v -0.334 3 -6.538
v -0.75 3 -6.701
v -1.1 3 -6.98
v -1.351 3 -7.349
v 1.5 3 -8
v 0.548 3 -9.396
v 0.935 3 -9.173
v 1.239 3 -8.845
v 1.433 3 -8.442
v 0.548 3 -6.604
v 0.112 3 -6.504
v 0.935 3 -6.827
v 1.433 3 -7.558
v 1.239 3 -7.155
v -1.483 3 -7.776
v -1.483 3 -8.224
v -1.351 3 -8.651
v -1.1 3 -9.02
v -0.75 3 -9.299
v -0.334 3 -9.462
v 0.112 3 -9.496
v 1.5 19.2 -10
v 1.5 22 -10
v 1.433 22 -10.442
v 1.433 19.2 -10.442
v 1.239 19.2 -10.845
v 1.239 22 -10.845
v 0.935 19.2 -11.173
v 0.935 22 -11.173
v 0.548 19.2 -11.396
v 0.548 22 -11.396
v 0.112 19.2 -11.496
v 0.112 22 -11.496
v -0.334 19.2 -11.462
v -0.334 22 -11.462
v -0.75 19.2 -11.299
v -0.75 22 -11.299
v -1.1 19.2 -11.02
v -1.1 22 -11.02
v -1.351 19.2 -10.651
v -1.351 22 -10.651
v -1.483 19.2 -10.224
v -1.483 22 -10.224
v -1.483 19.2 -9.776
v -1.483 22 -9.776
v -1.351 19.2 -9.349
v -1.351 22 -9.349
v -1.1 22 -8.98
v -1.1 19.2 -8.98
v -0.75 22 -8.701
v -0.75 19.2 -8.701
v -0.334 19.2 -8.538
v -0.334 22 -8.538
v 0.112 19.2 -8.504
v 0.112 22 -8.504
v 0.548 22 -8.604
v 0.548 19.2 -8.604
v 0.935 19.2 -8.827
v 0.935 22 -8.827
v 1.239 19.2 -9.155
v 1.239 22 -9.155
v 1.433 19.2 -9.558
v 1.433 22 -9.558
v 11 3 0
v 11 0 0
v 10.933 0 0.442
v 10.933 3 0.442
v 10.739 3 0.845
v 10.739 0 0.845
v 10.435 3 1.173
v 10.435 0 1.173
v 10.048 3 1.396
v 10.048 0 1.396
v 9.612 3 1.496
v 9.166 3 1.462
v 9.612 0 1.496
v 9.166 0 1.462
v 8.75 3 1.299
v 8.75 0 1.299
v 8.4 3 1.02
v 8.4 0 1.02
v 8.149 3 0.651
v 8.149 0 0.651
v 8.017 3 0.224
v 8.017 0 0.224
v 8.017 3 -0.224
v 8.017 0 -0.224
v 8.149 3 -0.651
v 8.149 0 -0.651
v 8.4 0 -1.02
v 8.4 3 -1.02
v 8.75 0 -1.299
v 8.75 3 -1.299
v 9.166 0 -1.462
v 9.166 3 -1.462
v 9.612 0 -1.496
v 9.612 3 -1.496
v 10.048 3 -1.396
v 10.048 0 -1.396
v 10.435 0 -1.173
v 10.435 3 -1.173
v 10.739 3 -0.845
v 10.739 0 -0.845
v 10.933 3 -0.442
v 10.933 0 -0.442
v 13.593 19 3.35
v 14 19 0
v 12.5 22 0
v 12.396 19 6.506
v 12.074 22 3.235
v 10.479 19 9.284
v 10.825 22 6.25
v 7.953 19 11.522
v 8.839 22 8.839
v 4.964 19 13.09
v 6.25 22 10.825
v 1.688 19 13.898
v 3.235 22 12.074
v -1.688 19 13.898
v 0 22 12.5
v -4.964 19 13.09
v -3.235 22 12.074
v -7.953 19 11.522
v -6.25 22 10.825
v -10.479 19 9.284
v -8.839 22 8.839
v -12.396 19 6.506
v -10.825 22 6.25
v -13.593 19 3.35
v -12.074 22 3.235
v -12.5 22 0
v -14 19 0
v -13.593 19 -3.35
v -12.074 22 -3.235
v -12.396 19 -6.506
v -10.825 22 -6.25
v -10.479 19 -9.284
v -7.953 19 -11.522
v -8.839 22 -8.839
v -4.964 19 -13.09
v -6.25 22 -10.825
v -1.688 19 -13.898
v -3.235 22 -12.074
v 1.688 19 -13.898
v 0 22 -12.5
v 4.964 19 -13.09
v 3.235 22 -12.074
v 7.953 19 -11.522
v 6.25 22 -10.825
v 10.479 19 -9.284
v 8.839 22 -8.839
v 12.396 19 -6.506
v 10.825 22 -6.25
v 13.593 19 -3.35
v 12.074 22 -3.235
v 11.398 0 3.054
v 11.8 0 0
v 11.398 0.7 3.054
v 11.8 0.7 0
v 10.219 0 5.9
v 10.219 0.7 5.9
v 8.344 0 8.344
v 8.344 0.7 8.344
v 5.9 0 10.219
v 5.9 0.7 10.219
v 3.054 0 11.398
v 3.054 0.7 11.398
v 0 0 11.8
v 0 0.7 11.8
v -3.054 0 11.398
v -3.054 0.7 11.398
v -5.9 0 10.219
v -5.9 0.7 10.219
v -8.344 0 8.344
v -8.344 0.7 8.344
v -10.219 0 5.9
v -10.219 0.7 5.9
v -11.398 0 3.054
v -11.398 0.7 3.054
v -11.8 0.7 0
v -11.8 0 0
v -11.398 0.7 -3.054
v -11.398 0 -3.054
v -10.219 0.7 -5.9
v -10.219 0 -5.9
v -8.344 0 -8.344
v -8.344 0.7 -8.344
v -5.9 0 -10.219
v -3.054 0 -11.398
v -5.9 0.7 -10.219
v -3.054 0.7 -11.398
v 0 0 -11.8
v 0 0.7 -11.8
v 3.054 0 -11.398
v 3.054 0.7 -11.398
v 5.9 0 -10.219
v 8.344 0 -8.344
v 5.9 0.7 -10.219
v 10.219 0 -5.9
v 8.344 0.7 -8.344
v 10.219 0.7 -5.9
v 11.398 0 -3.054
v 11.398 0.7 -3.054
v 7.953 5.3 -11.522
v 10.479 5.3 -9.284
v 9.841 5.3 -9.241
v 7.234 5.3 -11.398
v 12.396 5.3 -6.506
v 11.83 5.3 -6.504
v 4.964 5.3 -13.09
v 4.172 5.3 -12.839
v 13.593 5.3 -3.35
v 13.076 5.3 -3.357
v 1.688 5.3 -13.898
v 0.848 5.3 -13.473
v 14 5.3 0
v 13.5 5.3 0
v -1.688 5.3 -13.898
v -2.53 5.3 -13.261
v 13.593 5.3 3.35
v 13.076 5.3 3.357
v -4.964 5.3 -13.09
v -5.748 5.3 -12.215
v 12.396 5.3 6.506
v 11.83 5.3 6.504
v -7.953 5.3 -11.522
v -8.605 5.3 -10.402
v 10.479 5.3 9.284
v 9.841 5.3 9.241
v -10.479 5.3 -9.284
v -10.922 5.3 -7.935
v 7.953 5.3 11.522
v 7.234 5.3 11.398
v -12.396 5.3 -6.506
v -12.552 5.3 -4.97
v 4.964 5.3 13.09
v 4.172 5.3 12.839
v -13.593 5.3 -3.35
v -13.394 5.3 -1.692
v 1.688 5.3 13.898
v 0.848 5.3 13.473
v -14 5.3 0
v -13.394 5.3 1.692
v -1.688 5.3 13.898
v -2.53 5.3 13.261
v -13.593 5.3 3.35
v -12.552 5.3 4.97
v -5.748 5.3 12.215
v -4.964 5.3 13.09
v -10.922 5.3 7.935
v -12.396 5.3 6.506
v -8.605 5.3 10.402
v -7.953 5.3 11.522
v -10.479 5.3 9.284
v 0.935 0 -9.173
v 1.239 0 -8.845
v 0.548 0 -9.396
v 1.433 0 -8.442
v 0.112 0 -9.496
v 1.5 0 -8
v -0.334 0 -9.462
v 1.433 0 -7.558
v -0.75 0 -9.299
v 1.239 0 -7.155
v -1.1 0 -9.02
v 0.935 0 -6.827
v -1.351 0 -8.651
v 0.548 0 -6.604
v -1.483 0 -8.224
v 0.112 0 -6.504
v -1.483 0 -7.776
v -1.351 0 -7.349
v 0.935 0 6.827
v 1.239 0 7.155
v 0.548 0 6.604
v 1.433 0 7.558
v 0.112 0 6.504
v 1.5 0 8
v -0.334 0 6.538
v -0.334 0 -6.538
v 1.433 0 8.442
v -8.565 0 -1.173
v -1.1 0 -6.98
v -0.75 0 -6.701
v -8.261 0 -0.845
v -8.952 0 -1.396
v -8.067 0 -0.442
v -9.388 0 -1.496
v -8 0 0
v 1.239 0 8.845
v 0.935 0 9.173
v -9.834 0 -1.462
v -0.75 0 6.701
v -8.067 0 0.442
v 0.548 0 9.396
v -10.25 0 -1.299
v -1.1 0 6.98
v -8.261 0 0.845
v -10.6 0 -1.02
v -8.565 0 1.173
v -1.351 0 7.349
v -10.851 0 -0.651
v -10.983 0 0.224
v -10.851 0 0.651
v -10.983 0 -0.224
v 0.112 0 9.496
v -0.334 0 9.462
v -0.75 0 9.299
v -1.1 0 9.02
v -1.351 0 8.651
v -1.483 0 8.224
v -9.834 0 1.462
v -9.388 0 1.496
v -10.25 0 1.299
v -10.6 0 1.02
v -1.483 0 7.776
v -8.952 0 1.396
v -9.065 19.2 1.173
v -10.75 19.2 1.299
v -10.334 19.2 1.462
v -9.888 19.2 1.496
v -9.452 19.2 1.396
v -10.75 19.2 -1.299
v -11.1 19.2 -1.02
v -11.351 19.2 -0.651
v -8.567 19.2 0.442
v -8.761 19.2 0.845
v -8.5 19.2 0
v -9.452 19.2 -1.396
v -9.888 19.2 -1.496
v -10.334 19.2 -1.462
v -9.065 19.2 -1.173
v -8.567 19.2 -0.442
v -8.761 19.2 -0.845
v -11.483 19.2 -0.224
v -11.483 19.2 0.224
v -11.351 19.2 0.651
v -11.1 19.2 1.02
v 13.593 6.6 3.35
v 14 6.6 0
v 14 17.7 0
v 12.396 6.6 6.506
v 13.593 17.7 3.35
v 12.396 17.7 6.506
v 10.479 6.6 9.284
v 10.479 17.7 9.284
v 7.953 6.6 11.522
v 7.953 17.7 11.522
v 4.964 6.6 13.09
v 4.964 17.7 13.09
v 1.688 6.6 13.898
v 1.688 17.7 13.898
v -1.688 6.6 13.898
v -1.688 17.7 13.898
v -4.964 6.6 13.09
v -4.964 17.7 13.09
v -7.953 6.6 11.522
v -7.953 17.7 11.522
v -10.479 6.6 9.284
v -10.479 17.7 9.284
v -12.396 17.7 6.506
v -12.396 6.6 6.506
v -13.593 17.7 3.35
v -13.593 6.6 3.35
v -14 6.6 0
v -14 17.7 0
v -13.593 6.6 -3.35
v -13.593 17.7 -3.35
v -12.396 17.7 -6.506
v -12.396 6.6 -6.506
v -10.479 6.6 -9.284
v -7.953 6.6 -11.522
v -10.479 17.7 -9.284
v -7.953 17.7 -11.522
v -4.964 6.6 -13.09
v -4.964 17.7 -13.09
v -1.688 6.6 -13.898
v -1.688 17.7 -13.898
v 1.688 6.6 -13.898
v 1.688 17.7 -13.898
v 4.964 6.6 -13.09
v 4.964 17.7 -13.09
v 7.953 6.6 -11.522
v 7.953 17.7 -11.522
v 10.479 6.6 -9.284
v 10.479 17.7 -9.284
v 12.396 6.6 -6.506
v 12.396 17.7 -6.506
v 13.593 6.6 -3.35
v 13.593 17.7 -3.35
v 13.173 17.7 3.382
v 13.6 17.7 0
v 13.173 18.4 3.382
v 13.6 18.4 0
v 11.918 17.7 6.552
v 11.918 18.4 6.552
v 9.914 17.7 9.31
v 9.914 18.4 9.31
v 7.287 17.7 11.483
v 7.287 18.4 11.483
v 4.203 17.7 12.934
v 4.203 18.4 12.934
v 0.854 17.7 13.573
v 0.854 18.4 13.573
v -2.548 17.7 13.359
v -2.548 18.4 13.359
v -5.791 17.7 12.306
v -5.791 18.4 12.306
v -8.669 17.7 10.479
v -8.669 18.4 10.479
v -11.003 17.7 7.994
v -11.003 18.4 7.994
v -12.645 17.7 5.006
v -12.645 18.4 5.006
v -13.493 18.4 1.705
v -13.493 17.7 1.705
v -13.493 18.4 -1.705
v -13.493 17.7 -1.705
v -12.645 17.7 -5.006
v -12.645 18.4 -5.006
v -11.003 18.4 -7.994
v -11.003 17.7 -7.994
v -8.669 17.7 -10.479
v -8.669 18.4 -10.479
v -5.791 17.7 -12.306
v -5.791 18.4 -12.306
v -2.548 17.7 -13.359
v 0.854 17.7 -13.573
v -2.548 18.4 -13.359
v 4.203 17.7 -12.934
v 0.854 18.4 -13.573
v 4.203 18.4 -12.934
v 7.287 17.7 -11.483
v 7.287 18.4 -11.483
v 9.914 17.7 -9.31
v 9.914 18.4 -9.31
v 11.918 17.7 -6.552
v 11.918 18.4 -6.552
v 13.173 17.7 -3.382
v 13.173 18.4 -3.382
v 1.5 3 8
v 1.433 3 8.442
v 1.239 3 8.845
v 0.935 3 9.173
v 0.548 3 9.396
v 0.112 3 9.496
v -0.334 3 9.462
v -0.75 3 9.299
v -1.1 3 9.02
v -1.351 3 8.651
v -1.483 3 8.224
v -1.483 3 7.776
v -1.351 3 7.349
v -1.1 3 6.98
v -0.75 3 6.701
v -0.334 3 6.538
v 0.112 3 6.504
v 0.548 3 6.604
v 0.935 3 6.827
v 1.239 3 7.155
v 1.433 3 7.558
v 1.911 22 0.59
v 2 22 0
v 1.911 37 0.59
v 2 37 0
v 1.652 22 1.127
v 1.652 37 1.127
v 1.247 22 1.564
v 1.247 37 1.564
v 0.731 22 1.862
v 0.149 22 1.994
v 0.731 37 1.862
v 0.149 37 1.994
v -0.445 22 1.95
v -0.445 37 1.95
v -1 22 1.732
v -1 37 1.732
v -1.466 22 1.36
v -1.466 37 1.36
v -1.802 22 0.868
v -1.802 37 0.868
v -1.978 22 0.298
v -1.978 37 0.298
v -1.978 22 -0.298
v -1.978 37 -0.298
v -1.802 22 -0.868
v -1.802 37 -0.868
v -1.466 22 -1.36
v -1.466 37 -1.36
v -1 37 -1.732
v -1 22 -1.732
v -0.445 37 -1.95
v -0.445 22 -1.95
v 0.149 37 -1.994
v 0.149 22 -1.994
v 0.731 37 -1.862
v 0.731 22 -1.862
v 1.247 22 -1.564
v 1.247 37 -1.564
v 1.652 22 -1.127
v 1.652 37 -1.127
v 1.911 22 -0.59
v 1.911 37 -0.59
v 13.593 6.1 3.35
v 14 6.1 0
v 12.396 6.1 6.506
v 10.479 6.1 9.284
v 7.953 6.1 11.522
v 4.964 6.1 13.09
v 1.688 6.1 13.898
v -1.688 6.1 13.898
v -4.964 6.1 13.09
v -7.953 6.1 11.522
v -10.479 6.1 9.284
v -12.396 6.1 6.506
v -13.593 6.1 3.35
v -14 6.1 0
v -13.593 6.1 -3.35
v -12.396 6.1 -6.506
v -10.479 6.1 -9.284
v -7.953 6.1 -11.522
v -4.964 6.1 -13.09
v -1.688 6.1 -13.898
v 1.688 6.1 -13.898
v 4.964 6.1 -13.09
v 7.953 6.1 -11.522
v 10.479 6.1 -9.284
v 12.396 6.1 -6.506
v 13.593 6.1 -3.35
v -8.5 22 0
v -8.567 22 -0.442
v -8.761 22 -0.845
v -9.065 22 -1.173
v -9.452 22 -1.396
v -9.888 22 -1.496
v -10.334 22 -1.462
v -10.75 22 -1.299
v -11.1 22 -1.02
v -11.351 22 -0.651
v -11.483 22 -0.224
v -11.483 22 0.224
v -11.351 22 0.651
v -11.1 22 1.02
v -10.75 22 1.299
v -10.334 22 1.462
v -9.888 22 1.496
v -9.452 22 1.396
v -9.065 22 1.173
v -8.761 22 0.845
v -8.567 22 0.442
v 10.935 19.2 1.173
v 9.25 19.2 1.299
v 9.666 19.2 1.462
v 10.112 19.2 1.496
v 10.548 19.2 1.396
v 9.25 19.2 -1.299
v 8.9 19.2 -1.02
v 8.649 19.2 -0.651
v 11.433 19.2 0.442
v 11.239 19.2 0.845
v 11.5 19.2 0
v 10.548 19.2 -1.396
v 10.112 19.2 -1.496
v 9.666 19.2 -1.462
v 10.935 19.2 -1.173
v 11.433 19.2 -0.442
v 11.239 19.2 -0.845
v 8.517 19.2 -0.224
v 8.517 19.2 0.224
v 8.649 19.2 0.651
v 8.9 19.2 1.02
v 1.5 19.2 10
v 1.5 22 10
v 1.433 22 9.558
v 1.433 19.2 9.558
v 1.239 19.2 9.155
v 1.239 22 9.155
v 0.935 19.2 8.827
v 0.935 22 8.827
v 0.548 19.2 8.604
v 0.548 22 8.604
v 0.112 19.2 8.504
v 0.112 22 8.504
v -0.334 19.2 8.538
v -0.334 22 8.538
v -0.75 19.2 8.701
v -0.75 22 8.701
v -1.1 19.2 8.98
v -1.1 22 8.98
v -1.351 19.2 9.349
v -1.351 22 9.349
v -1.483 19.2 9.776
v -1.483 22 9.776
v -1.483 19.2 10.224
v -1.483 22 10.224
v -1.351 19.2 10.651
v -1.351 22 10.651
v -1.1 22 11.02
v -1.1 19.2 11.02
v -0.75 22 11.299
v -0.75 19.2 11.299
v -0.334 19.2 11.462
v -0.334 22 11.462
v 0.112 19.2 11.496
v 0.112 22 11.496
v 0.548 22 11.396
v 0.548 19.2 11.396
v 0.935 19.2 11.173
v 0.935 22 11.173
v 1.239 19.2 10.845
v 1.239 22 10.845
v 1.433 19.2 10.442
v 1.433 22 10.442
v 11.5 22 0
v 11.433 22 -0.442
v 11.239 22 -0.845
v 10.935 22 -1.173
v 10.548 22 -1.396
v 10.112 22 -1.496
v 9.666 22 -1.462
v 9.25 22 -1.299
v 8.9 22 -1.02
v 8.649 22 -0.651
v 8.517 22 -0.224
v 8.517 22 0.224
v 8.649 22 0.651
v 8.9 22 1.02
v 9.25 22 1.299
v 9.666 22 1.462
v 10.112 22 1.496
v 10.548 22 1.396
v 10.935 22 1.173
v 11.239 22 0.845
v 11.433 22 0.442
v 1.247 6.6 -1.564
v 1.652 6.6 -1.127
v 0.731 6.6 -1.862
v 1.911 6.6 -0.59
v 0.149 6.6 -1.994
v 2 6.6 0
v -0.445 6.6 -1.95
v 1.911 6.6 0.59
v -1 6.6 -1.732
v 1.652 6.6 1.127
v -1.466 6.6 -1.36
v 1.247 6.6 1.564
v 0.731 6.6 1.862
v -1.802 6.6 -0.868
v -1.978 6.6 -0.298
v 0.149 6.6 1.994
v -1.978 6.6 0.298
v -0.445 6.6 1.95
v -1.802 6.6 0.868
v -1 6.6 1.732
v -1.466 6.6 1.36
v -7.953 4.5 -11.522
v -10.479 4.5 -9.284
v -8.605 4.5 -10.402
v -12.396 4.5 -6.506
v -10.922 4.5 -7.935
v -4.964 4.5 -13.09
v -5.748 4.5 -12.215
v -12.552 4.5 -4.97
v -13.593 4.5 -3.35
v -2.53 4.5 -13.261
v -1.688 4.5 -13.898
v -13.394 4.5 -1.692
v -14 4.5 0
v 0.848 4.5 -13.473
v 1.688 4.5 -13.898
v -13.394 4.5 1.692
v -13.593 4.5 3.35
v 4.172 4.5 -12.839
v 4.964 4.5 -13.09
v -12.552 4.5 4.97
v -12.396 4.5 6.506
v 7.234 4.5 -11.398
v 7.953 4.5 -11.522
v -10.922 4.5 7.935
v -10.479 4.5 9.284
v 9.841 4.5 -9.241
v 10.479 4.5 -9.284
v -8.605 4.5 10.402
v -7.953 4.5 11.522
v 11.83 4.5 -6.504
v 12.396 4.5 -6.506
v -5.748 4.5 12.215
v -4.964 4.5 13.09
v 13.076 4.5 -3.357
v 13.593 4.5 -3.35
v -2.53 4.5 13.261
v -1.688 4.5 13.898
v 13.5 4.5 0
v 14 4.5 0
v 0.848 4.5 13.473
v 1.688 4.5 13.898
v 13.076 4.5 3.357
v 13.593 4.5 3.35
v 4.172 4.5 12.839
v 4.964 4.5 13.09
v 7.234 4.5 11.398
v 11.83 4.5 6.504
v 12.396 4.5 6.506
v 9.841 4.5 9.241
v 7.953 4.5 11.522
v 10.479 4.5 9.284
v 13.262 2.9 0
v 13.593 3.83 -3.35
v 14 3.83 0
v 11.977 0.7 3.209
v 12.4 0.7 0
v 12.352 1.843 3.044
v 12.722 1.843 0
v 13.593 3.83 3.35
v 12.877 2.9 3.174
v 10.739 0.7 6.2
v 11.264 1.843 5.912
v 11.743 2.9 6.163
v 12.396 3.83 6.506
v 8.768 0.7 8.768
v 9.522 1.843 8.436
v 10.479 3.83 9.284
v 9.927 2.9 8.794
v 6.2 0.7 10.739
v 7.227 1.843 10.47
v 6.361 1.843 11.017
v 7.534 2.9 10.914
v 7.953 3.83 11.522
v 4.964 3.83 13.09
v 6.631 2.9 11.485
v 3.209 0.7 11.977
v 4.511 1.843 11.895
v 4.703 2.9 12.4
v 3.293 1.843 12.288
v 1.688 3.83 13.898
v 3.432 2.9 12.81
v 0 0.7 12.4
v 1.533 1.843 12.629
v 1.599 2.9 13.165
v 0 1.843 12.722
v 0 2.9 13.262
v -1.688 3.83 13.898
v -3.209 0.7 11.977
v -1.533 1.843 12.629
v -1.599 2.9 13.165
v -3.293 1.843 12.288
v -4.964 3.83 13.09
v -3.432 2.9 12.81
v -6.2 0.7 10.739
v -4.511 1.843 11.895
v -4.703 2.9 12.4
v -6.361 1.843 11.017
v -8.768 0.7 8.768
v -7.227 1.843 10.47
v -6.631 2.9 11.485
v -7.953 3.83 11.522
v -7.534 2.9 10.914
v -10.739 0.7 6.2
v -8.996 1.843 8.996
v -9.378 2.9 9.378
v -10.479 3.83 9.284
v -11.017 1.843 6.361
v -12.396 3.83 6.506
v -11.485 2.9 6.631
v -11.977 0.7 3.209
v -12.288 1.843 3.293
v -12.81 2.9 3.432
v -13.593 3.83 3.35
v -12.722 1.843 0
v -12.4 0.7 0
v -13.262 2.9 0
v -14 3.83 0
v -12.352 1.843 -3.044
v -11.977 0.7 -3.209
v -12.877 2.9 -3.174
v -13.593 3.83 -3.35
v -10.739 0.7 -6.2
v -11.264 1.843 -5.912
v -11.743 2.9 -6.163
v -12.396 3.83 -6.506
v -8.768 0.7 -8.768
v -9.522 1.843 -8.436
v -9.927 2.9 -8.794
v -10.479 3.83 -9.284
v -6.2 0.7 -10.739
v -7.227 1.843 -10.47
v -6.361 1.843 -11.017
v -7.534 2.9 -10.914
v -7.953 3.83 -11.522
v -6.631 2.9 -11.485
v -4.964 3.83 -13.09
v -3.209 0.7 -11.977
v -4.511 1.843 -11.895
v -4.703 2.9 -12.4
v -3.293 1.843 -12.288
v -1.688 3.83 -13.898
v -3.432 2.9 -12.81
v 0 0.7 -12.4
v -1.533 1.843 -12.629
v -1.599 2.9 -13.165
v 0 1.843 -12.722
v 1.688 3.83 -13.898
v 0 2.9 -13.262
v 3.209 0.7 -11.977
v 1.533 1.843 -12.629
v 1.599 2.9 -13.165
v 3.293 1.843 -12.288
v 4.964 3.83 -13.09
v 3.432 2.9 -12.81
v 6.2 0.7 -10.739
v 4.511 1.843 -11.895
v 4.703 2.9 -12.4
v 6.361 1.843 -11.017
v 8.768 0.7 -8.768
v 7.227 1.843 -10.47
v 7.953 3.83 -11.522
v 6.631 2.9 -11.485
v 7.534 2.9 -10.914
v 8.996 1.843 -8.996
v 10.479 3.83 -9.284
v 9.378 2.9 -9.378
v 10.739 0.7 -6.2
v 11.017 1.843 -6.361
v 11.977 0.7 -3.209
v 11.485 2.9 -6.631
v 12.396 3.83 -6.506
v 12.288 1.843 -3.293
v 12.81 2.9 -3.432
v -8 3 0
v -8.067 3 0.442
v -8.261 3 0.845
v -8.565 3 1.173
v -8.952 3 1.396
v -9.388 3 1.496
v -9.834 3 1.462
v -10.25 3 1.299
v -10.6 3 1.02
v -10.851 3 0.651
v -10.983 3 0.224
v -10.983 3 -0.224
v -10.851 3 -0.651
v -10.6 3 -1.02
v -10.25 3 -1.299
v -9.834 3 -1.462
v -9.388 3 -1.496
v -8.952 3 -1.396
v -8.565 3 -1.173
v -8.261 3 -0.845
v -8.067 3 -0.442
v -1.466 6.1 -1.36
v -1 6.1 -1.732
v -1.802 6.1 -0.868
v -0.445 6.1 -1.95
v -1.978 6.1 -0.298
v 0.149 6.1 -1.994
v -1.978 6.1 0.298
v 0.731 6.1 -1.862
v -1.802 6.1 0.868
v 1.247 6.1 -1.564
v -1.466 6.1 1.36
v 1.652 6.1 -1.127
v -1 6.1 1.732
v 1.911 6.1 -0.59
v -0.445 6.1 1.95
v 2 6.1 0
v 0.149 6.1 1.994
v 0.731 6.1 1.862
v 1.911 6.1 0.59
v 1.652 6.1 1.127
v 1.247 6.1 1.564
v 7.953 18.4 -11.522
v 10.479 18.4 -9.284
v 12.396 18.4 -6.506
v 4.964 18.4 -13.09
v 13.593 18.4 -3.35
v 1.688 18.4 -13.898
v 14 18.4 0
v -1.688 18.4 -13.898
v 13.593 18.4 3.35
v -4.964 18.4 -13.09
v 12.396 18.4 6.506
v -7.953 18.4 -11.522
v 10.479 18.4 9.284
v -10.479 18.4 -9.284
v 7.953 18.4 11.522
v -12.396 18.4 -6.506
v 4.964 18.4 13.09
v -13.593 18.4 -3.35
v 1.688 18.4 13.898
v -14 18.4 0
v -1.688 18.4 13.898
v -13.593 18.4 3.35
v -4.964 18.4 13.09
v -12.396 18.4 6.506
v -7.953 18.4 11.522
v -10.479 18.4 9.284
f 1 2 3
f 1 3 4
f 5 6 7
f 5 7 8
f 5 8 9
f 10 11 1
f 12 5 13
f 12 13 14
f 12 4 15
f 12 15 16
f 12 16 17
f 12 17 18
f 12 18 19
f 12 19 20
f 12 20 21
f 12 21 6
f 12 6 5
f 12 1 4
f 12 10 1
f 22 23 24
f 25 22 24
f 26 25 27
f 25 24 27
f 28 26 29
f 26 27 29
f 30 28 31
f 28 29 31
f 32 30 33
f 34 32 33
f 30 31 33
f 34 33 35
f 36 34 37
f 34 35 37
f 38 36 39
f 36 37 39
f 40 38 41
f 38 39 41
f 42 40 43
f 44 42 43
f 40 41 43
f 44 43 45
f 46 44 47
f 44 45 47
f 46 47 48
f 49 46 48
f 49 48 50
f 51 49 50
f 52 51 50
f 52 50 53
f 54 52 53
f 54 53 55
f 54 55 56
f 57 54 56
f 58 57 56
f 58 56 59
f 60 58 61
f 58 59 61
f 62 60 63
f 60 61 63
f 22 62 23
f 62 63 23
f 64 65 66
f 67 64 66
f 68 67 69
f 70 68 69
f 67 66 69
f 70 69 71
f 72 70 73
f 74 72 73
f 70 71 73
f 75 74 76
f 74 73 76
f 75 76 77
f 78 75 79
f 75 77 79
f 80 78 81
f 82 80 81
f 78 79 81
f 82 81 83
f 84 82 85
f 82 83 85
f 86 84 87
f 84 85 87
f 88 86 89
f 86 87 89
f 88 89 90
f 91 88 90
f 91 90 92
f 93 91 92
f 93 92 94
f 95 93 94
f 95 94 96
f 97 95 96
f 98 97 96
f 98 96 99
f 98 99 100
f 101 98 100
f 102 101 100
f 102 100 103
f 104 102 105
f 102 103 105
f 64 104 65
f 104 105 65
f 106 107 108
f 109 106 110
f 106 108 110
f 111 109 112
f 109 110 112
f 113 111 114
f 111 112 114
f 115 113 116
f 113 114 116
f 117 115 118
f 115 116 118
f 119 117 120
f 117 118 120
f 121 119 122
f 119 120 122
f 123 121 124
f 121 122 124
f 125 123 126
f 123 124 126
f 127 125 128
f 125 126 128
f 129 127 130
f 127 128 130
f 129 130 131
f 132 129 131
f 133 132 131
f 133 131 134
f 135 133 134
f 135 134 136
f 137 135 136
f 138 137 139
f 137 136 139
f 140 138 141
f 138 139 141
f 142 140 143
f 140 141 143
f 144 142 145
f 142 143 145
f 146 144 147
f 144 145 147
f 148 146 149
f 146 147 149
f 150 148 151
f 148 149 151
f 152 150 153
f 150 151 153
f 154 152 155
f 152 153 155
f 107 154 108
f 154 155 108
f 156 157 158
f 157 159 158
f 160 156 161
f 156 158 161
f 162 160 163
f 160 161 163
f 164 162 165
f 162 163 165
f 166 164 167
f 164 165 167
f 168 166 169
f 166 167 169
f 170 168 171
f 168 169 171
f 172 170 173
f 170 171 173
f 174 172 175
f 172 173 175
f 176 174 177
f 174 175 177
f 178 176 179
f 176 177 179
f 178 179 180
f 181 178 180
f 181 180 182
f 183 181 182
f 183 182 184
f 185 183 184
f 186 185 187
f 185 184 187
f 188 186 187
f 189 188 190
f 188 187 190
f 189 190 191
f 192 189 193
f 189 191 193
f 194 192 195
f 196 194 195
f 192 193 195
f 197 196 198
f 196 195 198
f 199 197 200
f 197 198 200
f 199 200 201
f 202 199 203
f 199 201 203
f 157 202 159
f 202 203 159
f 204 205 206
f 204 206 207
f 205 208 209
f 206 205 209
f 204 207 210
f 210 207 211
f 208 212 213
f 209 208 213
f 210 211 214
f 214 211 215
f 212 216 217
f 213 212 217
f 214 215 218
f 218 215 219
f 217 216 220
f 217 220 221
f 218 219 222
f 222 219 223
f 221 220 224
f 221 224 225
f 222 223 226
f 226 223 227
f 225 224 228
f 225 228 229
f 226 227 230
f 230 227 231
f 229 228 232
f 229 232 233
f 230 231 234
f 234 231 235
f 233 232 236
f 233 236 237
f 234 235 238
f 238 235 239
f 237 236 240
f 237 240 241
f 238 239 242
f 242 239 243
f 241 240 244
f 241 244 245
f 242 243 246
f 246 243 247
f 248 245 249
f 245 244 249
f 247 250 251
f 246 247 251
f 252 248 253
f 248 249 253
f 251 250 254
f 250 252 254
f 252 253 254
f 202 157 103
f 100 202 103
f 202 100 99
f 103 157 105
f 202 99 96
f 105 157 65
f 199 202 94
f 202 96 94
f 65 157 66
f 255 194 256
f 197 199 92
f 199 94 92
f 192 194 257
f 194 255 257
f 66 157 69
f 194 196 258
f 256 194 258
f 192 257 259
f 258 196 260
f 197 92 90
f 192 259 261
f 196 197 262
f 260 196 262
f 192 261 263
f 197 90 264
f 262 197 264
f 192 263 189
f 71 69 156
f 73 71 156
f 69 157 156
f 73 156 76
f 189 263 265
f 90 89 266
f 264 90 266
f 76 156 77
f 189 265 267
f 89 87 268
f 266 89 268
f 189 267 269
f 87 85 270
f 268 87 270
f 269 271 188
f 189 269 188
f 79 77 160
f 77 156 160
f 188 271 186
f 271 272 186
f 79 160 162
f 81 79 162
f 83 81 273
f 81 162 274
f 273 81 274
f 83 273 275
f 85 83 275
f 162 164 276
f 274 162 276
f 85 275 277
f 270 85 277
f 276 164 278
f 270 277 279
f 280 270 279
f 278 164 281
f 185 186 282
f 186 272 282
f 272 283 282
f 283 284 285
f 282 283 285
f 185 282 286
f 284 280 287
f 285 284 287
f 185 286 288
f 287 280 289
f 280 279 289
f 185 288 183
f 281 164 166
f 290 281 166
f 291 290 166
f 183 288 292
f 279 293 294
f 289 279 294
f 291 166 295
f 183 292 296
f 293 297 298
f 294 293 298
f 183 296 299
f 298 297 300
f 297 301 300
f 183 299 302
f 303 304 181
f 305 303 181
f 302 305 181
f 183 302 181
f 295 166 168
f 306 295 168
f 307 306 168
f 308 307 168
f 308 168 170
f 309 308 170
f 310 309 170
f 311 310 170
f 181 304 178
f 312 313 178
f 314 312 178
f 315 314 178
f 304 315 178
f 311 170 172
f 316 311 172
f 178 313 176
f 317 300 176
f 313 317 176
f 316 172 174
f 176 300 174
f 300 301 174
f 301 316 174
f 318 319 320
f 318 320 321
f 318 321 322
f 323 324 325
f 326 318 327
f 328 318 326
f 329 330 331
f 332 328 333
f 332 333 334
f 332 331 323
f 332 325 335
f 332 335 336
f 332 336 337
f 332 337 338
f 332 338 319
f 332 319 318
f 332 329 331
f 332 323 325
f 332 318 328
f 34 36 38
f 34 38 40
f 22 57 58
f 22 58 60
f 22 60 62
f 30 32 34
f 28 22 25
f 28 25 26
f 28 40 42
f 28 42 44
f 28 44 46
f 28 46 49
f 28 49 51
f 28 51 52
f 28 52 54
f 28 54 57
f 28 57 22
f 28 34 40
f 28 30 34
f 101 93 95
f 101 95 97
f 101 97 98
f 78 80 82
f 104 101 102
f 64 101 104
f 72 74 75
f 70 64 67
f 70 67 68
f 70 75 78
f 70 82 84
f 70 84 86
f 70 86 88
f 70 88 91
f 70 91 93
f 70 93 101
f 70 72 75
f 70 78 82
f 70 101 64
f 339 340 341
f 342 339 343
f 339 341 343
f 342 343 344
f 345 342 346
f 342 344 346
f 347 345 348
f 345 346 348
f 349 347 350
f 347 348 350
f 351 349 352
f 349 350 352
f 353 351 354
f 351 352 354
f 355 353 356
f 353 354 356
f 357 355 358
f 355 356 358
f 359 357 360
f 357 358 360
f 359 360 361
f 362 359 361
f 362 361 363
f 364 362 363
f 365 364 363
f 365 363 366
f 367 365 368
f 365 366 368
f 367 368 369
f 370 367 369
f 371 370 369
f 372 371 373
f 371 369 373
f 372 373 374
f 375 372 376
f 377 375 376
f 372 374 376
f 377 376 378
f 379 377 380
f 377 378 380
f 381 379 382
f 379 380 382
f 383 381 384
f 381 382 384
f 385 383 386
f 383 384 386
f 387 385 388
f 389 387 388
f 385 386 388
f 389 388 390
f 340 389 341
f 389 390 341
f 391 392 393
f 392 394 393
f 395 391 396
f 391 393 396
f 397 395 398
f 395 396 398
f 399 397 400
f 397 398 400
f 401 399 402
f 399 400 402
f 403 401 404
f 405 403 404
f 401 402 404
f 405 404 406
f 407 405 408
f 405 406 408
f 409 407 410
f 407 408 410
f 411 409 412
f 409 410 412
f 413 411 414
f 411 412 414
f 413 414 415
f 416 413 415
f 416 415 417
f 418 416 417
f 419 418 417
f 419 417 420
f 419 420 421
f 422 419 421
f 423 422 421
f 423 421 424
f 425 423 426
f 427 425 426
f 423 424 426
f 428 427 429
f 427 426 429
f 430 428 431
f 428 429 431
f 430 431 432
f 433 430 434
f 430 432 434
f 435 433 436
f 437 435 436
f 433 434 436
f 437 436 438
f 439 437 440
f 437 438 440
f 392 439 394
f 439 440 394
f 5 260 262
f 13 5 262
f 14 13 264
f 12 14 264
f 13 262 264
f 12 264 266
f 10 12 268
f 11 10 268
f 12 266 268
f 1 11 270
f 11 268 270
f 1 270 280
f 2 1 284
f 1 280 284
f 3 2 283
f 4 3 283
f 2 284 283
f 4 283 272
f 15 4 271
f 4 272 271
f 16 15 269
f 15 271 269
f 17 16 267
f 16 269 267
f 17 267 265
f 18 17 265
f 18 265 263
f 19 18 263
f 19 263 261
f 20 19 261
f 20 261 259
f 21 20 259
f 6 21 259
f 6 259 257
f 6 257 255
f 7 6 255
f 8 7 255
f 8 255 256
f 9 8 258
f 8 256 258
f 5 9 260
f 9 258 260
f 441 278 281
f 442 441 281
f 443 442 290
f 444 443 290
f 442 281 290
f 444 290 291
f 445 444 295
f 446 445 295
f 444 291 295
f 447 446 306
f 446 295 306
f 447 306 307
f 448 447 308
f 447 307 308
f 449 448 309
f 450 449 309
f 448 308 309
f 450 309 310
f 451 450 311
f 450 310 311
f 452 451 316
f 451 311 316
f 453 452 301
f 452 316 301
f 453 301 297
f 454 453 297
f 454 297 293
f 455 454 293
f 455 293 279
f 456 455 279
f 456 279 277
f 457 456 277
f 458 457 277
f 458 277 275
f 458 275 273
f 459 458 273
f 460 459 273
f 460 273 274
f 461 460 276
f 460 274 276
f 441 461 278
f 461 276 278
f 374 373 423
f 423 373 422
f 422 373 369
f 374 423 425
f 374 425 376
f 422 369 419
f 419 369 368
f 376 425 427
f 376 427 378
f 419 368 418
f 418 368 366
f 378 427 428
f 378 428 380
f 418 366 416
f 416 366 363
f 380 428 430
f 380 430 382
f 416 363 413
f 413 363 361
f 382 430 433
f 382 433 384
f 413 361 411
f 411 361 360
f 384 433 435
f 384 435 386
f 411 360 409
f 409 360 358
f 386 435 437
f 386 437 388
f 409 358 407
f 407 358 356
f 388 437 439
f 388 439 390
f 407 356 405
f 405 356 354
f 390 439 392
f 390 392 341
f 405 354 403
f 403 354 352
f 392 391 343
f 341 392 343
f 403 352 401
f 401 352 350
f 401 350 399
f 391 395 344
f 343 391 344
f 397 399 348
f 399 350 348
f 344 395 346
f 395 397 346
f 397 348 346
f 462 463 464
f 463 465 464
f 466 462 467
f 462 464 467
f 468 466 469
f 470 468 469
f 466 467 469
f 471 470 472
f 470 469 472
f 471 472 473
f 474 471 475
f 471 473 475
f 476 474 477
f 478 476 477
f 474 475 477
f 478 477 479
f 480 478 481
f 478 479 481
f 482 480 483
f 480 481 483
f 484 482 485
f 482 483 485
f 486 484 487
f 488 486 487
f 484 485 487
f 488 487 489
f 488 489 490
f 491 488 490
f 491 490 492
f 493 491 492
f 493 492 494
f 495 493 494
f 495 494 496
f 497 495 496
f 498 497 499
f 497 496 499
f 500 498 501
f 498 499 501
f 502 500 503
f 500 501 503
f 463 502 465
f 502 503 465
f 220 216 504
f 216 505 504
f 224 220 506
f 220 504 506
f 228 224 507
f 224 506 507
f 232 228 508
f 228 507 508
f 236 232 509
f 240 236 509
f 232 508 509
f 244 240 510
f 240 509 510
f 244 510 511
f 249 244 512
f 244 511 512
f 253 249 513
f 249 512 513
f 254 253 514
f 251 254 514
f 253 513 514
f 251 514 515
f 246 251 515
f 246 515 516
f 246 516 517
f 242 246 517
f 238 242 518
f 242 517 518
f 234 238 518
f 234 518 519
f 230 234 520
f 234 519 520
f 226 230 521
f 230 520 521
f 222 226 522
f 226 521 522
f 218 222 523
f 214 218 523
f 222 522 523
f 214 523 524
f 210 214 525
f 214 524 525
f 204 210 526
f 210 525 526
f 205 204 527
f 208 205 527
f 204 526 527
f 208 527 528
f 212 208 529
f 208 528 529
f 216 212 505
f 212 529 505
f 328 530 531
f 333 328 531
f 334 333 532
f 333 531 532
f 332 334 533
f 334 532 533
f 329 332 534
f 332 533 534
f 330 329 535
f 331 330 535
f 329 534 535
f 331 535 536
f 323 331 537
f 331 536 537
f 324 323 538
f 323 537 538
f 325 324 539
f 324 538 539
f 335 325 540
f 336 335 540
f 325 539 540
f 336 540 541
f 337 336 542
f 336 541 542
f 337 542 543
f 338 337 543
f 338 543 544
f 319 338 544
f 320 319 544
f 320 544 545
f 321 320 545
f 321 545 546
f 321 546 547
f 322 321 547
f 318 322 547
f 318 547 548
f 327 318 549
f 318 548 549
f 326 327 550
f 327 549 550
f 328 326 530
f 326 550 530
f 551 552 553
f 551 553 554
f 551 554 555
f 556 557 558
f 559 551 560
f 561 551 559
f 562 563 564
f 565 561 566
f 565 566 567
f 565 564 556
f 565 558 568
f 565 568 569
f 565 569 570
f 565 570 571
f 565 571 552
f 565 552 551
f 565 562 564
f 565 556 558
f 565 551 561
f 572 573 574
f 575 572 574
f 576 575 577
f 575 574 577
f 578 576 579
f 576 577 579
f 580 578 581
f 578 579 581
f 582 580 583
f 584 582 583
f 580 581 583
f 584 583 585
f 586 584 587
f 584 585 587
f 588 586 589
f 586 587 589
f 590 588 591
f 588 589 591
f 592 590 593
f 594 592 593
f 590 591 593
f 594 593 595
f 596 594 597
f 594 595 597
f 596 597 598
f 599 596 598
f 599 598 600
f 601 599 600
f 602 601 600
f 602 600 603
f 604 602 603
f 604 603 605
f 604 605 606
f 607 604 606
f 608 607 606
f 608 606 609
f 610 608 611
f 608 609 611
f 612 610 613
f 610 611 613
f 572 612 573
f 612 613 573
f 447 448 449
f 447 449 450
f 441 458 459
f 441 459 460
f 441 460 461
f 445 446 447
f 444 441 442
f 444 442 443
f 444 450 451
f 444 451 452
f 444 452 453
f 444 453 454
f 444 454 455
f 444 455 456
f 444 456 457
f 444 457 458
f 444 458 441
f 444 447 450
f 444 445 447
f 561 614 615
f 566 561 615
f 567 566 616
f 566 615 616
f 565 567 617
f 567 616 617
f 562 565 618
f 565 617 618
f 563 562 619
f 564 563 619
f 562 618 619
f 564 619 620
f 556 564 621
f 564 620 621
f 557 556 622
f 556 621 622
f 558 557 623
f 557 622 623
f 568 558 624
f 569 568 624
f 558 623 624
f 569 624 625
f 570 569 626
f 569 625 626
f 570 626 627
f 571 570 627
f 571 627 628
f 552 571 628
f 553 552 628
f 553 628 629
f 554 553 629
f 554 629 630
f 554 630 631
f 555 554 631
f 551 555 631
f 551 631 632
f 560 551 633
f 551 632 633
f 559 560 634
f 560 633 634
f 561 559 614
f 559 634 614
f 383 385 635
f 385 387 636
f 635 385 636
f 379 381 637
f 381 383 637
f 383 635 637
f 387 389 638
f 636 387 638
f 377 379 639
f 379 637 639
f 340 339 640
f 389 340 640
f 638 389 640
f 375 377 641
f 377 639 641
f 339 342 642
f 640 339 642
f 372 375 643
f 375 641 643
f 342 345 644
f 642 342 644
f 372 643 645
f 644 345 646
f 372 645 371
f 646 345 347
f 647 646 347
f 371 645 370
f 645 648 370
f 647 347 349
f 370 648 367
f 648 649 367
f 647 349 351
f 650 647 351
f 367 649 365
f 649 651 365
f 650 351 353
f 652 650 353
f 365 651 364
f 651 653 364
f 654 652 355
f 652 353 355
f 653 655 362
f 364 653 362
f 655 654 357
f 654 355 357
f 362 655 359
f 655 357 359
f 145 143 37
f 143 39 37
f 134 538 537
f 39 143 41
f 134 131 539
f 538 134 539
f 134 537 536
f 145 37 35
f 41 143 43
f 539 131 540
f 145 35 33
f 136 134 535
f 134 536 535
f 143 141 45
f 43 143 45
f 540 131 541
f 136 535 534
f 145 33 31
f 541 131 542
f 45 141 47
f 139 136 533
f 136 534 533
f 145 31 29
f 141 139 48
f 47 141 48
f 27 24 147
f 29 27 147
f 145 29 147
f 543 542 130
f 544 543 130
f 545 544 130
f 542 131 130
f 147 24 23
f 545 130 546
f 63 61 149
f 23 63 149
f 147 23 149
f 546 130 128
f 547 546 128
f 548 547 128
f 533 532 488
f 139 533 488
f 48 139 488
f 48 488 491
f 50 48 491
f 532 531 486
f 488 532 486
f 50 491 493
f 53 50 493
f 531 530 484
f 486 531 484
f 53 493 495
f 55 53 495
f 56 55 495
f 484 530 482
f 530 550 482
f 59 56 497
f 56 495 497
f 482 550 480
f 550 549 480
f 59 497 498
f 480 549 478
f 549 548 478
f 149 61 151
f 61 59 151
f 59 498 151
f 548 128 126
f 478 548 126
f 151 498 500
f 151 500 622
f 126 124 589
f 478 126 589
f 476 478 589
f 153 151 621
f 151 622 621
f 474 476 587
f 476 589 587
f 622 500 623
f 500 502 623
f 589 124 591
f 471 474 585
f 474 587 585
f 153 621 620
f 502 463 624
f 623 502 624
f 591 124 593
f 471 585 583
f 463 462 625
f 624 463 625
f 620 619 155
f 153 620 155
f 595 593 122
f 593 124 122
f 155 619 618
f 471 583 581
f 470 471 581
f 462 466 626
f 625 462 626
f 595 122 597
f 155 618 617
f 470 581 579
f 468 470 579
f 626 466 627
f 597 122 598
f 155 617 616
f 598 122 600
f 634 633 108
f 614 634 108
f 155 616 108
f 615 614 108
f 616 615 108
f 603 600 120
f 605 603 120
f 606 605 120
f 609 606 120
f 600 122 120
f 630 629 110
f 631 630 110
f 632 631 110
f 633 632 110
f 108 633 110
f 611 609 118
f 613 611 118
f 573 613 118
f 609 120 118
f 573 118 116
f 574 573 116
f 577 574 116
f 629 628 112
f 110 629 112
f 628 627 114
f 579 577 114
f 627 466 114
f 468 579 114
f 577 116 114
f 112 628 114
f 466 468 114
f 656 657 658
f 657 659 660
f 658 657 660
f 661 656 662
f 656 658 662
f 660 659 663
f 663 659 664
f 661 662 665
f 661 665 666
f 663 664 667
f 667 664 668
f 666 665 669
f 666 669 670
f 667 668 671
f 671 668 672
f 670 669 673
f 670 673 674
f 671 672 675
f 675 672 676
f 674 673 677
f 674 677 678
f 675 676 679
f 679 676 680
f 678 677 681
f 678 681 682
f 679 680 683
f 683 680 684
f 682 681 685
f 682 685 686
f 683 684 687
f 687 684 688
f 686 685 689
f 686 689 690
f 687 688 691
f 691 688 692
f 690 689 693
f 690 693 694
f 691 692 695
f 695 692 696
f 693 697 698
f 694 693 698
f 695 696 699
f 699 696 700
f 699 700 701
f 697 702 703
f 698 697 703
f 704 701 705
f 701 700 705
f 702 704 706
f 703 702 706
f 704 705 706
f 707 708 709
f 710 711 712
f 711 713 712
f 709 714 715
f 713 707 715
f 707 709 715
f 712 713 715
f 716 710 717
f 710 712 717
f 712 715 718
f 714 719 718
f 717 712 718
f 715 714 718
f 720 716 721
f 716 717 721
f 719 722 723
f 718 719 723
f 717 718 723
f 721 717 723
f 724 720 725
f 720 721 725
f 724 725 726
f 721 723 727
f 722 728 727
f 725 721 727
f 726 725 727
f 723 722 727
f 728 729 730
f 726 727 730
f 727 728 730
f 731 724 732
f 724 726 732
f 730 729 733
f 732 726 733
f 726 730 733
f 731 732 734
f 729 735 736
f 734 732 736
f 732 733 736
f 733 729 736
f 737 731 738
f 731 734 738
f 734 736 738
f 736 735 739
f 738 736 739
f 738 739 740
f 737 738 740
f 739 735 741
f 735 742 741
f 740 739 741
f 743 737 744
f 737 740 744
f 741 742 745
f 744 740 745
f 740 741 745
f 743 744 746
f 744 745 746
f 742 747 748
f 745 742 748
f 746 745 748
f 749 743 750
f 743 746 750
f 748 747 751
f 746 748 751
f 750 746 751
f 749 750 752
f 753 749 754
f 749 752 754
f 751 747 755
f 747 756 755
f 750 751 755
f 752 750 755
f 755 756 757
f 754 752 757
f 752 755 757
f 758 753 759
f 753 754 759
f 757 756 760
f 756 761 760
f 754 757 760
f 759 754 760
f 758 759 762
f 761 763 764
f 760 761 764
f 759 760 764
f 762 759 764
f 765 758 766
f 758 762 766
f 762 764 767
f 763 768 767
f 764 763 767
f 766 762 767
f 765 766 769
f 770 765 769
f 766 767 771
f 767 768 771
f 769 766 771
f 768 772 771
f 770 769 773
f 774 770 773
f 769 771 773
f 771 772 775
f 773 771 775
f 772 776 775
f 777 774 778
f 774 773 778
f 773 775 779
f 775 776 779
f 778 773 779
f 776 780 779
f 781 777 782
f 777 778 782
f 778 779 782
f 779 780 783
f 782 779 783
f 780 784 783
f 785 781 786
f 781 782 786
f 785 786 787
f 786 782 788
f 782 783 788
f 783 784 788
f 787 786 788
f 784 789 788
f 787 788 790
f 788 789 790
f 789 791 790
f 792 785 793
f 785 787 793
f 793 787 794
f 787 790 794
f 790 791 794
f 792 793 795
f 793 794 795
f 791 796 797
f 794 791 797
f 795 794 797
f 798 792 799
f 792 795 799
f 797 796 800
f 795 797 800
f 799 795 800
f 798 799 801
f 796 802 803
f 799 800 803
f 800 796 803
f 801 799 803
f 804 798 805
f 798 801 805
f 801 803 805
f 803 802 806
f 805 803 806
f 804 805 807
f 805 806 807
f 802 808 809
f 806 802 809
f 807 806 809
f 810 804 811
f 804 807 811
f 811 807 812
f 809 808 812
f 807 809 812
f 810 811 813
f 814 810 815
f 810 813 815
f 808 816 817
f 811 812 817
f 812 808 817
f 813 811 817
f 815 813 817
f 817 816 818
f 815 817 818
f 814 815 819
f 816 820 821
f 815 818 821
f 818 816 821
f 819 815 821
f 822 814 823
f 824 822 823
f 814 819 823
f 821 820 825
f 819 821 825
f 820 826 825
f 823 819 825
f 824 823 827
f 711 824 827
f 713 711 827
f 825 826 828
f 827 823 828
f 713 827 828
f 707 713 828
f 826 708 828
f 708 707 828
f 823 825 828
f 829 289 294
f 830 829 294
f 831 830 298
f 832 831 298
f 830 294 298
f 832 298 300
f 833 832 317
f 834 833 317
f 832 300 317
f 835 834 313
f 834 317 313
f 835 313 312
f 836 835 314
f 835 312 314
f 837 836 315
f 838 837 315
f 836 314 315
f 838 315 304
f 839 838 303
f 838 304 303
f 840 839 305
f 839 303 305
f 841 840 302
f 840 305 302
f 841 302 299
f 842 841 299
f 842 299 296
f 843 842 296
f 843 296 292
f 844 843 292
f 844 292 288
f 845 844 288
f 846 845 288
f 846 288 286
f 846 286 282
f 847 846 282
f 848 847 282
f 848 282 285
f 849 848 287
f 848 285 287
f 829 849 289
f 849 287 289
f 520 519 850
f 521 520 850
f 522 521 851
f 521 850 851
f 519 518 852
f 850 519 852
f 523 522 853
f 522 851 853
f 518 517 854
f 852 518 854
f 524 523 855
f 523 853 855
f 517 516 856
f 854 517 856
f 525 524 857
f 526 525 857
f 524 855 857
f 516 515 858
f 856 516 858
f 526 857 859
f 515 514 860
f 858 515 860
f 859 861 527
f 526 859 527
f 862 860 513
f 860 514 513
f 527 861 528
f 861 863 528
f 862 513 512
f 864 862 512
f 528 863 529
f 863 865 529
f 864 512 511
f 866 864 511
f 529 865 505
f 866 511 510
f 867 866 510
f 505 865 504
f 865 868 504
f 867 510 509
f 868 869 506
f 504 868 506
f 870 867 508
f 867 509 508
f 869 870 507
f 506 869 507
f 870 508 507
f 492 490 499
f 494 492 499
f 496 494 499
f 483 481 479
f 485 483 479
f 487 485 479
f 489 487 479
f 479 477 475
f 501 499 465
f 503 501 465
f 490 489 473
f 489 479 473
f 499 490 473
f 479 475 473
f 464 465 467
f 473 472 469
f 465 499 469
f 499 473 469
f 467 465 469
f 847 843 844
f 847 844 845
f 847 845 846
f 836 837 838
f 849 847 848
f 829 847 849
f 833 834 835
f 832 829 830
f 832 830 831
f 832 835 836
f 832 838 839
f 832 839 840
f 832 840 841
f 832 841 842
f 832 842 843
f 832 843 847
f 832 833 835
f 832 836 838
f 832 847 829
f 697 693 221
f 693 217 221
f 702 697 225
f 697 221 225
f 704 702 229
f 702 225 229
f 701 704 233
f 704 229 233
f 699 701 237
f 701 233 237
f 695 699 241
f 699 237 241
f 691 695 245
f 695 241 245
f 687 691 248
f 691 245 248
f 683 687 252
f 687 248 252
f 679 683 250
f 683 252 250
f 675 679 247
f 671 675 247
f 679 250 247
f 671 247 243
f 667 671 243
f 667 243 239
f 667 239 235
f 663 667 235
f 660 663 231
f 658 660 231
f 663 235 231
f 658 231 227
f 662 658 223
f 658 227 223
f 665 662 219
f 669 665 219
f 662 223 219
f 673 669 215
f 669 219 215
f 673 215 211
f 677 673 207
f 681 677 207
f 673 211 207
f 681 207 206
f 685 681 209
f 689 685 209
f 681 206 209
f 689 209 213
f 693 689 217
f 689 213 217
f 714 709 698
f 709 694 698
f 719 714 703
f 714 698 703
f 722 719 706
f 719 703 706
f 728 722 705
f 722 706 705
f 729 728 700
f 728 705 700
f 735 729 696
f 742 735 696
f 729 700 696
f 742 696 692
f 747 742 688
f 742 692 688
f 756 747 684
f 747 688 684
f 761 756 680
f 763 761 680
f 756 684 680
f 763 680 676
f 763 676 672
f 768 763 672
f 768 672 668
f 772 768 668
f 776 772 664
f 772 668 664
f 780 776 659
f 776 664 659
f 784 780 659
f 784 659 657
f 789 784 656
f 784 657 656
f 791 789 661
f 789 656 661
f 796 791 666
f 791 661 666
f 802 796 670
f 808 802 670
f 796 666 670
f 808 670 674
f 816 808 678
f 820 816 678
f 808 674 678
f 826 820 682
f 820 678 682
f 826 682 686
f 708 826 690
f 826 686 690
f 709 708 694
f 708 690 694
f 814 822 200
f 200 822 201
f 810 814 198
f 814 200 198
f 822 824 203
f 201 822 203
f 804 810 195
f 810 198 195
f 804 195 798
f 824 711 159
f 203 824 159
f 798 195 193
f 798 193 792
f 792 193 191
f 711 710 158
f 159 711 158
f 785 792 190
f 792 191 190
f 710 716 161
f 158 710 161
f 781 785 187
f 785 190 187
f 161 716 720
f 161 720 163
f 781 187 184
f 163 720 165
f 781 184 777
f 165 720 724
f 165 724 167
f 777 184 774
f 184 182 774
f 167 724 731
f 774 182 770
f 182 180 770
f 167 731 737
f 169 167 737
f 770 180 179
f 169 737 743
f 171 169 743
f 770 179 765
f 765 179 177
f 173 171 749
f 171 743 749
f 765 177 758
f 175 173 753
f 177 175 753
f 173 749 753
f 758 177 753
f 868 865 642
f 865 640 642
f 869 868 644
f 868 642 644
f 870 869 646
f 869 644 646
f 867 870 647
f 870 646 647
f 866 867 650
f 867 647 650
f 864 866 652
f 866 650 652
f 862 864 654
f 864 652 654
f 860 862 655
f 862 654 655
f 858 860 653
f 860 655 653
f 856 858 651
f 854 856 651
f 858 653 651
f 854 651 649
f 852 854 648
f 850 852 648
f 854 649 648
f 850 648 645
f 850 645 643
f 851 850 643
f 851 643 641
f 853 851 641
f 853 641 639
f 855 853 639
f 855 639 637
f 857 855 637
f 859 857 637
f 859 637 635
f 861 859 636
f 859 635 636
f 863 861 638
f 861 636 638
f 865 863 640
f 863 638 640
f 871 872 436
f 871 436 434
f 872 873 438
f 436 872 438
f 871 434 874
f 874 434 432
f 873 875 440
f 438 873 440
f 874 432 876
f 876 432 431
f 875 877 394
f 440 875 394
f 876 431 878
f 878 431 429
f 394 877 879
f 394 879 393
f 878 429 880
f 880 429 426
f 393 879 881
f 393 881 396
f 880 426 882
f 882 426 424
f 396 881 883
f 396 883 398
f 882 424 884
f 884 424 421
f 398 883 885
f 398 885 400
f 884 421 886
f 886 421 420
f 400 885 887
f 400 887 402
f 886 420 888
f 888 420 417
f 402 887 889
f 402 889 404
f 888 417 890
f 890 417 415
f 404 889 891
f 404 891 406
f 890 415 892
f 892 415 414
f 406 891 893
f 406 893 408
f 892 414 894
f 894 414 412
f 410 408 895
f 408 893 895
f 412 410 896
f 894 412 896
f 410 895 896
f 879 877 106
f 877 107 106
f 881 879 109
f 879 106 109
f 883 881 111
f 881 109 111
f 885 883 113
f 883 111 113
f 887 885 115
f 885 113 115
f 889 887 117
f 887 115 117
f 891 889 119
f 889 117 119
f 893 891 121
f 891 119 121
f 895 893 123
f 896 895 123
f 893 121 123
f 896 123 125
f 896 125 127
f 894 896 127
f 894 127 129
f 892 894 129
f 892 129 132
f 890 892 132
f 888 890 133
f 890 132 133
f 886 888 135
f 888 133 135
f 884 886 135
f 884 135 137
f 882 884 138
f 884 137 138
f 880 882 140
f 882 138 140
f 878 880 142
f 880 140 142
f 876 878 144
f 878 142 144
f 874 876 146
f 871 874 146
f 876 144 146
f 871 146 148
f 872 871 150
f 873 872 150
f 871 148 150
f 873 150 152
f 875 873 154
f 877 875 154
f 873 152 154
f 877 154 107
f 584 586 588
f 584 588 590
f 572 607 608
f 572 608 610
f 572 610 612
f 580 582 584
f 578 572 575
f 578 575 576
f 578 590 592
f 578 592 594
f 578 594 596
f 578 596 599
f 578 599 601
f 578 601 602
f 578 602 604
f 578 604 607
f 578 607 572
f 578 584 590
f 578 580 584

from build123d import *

# Parameters (mm, degrees)
SKETCH2_R          = 1.5
CUT_EXTRUDE1_DEPTH = 3
SKETCH3_R          = 1.5
CUT_EXTRUDE2_DEPTH = 2.8


with BuildPart() as part:
    # Sketch1 → Revolve1 (revolve)
    with BuildSketch(Plane.XY):
        with BuildLine():
            Line((0, 0), (11.8, 0))
            Line((11.8, 0), (11.8, 0.7))
            Line((11.8, 0.7), (12.4, 0.7))
            ThreePointArc((12.4, 0.7), (12.965636633, 2.38480236), (14, 3.83))
            Line((14, 3.83), (14, 4.5))
            Line((14, 4.5), (13.5, 4.5))
            Line((13.5, 4.5), (13.5, 5.3))
            Line((13.5, 5.3), (14, 5.3))
            Line((14, 5.3), (14, 6.1))
            Line((14, 6.1), (2, 6.1))
            Line((2, 6.1), (2, 6.6))
            Line((2, 6.6), (14, 6.6))
            Line((14, 6.6), (14, 17.7))
            Line((14, 17.7), (13.6, 17.7))
            Line((13.6, 17.7), (13.6, 18.4))
            Line((13.6, 18.4), (14, 18.4))
            Line((14, 18.4), (14, 19))
            Line((14, 19), (12.5, 22))
            Line((12.5, 22), (2, 22))
            Line((2, 22), (2, 37))
            Line((2, 37), (0, 37))
            Line((0, 37), (0, 0))
        make_face()
    revolve(axis=Axis((0, 37, 0), (0, -1, 0)))

    # Sketch2 → Cut-Extrude1 (cut)
    with BuildSketch(Plane.XZ):
        with Locations((0, 8)):
            Circle(SKETCH2_R)
        with Locations((9.5, 0)):
            Circle(SKETCH2_R)
        with Locations((0, -8)):
            Circle(SKETCH2_R)
        with Locations((-9.5, 0)):
            Circle(SKETCH2_R)
    extrude(amount=-CUT_EXTRUDE1_DEPTH, mode=Mode.SUBTRACT)

    # Sketch3 → Cut-Extrude2 (cut)
    with BuildSketch(Plane(origin=(0, 22, 0), x_dir=(1, 0, 0), z_dir=(0, 1, 0))):
        with Locations((0, 10)):
            Circle(SKETCH3_R)
        with Locations((10, 0)):
            Circle(SKETCH3_R)
        with Locations((0, -10)):
            Circle(SKETCH3_R)
        with Locations((-10, 0)):
            Circle(SKETCH3_R)
    extrude(amount=-CUT_EXTRUDE2_DEPTH, mode=Mode.SUBTRACT)


solid = part.part
